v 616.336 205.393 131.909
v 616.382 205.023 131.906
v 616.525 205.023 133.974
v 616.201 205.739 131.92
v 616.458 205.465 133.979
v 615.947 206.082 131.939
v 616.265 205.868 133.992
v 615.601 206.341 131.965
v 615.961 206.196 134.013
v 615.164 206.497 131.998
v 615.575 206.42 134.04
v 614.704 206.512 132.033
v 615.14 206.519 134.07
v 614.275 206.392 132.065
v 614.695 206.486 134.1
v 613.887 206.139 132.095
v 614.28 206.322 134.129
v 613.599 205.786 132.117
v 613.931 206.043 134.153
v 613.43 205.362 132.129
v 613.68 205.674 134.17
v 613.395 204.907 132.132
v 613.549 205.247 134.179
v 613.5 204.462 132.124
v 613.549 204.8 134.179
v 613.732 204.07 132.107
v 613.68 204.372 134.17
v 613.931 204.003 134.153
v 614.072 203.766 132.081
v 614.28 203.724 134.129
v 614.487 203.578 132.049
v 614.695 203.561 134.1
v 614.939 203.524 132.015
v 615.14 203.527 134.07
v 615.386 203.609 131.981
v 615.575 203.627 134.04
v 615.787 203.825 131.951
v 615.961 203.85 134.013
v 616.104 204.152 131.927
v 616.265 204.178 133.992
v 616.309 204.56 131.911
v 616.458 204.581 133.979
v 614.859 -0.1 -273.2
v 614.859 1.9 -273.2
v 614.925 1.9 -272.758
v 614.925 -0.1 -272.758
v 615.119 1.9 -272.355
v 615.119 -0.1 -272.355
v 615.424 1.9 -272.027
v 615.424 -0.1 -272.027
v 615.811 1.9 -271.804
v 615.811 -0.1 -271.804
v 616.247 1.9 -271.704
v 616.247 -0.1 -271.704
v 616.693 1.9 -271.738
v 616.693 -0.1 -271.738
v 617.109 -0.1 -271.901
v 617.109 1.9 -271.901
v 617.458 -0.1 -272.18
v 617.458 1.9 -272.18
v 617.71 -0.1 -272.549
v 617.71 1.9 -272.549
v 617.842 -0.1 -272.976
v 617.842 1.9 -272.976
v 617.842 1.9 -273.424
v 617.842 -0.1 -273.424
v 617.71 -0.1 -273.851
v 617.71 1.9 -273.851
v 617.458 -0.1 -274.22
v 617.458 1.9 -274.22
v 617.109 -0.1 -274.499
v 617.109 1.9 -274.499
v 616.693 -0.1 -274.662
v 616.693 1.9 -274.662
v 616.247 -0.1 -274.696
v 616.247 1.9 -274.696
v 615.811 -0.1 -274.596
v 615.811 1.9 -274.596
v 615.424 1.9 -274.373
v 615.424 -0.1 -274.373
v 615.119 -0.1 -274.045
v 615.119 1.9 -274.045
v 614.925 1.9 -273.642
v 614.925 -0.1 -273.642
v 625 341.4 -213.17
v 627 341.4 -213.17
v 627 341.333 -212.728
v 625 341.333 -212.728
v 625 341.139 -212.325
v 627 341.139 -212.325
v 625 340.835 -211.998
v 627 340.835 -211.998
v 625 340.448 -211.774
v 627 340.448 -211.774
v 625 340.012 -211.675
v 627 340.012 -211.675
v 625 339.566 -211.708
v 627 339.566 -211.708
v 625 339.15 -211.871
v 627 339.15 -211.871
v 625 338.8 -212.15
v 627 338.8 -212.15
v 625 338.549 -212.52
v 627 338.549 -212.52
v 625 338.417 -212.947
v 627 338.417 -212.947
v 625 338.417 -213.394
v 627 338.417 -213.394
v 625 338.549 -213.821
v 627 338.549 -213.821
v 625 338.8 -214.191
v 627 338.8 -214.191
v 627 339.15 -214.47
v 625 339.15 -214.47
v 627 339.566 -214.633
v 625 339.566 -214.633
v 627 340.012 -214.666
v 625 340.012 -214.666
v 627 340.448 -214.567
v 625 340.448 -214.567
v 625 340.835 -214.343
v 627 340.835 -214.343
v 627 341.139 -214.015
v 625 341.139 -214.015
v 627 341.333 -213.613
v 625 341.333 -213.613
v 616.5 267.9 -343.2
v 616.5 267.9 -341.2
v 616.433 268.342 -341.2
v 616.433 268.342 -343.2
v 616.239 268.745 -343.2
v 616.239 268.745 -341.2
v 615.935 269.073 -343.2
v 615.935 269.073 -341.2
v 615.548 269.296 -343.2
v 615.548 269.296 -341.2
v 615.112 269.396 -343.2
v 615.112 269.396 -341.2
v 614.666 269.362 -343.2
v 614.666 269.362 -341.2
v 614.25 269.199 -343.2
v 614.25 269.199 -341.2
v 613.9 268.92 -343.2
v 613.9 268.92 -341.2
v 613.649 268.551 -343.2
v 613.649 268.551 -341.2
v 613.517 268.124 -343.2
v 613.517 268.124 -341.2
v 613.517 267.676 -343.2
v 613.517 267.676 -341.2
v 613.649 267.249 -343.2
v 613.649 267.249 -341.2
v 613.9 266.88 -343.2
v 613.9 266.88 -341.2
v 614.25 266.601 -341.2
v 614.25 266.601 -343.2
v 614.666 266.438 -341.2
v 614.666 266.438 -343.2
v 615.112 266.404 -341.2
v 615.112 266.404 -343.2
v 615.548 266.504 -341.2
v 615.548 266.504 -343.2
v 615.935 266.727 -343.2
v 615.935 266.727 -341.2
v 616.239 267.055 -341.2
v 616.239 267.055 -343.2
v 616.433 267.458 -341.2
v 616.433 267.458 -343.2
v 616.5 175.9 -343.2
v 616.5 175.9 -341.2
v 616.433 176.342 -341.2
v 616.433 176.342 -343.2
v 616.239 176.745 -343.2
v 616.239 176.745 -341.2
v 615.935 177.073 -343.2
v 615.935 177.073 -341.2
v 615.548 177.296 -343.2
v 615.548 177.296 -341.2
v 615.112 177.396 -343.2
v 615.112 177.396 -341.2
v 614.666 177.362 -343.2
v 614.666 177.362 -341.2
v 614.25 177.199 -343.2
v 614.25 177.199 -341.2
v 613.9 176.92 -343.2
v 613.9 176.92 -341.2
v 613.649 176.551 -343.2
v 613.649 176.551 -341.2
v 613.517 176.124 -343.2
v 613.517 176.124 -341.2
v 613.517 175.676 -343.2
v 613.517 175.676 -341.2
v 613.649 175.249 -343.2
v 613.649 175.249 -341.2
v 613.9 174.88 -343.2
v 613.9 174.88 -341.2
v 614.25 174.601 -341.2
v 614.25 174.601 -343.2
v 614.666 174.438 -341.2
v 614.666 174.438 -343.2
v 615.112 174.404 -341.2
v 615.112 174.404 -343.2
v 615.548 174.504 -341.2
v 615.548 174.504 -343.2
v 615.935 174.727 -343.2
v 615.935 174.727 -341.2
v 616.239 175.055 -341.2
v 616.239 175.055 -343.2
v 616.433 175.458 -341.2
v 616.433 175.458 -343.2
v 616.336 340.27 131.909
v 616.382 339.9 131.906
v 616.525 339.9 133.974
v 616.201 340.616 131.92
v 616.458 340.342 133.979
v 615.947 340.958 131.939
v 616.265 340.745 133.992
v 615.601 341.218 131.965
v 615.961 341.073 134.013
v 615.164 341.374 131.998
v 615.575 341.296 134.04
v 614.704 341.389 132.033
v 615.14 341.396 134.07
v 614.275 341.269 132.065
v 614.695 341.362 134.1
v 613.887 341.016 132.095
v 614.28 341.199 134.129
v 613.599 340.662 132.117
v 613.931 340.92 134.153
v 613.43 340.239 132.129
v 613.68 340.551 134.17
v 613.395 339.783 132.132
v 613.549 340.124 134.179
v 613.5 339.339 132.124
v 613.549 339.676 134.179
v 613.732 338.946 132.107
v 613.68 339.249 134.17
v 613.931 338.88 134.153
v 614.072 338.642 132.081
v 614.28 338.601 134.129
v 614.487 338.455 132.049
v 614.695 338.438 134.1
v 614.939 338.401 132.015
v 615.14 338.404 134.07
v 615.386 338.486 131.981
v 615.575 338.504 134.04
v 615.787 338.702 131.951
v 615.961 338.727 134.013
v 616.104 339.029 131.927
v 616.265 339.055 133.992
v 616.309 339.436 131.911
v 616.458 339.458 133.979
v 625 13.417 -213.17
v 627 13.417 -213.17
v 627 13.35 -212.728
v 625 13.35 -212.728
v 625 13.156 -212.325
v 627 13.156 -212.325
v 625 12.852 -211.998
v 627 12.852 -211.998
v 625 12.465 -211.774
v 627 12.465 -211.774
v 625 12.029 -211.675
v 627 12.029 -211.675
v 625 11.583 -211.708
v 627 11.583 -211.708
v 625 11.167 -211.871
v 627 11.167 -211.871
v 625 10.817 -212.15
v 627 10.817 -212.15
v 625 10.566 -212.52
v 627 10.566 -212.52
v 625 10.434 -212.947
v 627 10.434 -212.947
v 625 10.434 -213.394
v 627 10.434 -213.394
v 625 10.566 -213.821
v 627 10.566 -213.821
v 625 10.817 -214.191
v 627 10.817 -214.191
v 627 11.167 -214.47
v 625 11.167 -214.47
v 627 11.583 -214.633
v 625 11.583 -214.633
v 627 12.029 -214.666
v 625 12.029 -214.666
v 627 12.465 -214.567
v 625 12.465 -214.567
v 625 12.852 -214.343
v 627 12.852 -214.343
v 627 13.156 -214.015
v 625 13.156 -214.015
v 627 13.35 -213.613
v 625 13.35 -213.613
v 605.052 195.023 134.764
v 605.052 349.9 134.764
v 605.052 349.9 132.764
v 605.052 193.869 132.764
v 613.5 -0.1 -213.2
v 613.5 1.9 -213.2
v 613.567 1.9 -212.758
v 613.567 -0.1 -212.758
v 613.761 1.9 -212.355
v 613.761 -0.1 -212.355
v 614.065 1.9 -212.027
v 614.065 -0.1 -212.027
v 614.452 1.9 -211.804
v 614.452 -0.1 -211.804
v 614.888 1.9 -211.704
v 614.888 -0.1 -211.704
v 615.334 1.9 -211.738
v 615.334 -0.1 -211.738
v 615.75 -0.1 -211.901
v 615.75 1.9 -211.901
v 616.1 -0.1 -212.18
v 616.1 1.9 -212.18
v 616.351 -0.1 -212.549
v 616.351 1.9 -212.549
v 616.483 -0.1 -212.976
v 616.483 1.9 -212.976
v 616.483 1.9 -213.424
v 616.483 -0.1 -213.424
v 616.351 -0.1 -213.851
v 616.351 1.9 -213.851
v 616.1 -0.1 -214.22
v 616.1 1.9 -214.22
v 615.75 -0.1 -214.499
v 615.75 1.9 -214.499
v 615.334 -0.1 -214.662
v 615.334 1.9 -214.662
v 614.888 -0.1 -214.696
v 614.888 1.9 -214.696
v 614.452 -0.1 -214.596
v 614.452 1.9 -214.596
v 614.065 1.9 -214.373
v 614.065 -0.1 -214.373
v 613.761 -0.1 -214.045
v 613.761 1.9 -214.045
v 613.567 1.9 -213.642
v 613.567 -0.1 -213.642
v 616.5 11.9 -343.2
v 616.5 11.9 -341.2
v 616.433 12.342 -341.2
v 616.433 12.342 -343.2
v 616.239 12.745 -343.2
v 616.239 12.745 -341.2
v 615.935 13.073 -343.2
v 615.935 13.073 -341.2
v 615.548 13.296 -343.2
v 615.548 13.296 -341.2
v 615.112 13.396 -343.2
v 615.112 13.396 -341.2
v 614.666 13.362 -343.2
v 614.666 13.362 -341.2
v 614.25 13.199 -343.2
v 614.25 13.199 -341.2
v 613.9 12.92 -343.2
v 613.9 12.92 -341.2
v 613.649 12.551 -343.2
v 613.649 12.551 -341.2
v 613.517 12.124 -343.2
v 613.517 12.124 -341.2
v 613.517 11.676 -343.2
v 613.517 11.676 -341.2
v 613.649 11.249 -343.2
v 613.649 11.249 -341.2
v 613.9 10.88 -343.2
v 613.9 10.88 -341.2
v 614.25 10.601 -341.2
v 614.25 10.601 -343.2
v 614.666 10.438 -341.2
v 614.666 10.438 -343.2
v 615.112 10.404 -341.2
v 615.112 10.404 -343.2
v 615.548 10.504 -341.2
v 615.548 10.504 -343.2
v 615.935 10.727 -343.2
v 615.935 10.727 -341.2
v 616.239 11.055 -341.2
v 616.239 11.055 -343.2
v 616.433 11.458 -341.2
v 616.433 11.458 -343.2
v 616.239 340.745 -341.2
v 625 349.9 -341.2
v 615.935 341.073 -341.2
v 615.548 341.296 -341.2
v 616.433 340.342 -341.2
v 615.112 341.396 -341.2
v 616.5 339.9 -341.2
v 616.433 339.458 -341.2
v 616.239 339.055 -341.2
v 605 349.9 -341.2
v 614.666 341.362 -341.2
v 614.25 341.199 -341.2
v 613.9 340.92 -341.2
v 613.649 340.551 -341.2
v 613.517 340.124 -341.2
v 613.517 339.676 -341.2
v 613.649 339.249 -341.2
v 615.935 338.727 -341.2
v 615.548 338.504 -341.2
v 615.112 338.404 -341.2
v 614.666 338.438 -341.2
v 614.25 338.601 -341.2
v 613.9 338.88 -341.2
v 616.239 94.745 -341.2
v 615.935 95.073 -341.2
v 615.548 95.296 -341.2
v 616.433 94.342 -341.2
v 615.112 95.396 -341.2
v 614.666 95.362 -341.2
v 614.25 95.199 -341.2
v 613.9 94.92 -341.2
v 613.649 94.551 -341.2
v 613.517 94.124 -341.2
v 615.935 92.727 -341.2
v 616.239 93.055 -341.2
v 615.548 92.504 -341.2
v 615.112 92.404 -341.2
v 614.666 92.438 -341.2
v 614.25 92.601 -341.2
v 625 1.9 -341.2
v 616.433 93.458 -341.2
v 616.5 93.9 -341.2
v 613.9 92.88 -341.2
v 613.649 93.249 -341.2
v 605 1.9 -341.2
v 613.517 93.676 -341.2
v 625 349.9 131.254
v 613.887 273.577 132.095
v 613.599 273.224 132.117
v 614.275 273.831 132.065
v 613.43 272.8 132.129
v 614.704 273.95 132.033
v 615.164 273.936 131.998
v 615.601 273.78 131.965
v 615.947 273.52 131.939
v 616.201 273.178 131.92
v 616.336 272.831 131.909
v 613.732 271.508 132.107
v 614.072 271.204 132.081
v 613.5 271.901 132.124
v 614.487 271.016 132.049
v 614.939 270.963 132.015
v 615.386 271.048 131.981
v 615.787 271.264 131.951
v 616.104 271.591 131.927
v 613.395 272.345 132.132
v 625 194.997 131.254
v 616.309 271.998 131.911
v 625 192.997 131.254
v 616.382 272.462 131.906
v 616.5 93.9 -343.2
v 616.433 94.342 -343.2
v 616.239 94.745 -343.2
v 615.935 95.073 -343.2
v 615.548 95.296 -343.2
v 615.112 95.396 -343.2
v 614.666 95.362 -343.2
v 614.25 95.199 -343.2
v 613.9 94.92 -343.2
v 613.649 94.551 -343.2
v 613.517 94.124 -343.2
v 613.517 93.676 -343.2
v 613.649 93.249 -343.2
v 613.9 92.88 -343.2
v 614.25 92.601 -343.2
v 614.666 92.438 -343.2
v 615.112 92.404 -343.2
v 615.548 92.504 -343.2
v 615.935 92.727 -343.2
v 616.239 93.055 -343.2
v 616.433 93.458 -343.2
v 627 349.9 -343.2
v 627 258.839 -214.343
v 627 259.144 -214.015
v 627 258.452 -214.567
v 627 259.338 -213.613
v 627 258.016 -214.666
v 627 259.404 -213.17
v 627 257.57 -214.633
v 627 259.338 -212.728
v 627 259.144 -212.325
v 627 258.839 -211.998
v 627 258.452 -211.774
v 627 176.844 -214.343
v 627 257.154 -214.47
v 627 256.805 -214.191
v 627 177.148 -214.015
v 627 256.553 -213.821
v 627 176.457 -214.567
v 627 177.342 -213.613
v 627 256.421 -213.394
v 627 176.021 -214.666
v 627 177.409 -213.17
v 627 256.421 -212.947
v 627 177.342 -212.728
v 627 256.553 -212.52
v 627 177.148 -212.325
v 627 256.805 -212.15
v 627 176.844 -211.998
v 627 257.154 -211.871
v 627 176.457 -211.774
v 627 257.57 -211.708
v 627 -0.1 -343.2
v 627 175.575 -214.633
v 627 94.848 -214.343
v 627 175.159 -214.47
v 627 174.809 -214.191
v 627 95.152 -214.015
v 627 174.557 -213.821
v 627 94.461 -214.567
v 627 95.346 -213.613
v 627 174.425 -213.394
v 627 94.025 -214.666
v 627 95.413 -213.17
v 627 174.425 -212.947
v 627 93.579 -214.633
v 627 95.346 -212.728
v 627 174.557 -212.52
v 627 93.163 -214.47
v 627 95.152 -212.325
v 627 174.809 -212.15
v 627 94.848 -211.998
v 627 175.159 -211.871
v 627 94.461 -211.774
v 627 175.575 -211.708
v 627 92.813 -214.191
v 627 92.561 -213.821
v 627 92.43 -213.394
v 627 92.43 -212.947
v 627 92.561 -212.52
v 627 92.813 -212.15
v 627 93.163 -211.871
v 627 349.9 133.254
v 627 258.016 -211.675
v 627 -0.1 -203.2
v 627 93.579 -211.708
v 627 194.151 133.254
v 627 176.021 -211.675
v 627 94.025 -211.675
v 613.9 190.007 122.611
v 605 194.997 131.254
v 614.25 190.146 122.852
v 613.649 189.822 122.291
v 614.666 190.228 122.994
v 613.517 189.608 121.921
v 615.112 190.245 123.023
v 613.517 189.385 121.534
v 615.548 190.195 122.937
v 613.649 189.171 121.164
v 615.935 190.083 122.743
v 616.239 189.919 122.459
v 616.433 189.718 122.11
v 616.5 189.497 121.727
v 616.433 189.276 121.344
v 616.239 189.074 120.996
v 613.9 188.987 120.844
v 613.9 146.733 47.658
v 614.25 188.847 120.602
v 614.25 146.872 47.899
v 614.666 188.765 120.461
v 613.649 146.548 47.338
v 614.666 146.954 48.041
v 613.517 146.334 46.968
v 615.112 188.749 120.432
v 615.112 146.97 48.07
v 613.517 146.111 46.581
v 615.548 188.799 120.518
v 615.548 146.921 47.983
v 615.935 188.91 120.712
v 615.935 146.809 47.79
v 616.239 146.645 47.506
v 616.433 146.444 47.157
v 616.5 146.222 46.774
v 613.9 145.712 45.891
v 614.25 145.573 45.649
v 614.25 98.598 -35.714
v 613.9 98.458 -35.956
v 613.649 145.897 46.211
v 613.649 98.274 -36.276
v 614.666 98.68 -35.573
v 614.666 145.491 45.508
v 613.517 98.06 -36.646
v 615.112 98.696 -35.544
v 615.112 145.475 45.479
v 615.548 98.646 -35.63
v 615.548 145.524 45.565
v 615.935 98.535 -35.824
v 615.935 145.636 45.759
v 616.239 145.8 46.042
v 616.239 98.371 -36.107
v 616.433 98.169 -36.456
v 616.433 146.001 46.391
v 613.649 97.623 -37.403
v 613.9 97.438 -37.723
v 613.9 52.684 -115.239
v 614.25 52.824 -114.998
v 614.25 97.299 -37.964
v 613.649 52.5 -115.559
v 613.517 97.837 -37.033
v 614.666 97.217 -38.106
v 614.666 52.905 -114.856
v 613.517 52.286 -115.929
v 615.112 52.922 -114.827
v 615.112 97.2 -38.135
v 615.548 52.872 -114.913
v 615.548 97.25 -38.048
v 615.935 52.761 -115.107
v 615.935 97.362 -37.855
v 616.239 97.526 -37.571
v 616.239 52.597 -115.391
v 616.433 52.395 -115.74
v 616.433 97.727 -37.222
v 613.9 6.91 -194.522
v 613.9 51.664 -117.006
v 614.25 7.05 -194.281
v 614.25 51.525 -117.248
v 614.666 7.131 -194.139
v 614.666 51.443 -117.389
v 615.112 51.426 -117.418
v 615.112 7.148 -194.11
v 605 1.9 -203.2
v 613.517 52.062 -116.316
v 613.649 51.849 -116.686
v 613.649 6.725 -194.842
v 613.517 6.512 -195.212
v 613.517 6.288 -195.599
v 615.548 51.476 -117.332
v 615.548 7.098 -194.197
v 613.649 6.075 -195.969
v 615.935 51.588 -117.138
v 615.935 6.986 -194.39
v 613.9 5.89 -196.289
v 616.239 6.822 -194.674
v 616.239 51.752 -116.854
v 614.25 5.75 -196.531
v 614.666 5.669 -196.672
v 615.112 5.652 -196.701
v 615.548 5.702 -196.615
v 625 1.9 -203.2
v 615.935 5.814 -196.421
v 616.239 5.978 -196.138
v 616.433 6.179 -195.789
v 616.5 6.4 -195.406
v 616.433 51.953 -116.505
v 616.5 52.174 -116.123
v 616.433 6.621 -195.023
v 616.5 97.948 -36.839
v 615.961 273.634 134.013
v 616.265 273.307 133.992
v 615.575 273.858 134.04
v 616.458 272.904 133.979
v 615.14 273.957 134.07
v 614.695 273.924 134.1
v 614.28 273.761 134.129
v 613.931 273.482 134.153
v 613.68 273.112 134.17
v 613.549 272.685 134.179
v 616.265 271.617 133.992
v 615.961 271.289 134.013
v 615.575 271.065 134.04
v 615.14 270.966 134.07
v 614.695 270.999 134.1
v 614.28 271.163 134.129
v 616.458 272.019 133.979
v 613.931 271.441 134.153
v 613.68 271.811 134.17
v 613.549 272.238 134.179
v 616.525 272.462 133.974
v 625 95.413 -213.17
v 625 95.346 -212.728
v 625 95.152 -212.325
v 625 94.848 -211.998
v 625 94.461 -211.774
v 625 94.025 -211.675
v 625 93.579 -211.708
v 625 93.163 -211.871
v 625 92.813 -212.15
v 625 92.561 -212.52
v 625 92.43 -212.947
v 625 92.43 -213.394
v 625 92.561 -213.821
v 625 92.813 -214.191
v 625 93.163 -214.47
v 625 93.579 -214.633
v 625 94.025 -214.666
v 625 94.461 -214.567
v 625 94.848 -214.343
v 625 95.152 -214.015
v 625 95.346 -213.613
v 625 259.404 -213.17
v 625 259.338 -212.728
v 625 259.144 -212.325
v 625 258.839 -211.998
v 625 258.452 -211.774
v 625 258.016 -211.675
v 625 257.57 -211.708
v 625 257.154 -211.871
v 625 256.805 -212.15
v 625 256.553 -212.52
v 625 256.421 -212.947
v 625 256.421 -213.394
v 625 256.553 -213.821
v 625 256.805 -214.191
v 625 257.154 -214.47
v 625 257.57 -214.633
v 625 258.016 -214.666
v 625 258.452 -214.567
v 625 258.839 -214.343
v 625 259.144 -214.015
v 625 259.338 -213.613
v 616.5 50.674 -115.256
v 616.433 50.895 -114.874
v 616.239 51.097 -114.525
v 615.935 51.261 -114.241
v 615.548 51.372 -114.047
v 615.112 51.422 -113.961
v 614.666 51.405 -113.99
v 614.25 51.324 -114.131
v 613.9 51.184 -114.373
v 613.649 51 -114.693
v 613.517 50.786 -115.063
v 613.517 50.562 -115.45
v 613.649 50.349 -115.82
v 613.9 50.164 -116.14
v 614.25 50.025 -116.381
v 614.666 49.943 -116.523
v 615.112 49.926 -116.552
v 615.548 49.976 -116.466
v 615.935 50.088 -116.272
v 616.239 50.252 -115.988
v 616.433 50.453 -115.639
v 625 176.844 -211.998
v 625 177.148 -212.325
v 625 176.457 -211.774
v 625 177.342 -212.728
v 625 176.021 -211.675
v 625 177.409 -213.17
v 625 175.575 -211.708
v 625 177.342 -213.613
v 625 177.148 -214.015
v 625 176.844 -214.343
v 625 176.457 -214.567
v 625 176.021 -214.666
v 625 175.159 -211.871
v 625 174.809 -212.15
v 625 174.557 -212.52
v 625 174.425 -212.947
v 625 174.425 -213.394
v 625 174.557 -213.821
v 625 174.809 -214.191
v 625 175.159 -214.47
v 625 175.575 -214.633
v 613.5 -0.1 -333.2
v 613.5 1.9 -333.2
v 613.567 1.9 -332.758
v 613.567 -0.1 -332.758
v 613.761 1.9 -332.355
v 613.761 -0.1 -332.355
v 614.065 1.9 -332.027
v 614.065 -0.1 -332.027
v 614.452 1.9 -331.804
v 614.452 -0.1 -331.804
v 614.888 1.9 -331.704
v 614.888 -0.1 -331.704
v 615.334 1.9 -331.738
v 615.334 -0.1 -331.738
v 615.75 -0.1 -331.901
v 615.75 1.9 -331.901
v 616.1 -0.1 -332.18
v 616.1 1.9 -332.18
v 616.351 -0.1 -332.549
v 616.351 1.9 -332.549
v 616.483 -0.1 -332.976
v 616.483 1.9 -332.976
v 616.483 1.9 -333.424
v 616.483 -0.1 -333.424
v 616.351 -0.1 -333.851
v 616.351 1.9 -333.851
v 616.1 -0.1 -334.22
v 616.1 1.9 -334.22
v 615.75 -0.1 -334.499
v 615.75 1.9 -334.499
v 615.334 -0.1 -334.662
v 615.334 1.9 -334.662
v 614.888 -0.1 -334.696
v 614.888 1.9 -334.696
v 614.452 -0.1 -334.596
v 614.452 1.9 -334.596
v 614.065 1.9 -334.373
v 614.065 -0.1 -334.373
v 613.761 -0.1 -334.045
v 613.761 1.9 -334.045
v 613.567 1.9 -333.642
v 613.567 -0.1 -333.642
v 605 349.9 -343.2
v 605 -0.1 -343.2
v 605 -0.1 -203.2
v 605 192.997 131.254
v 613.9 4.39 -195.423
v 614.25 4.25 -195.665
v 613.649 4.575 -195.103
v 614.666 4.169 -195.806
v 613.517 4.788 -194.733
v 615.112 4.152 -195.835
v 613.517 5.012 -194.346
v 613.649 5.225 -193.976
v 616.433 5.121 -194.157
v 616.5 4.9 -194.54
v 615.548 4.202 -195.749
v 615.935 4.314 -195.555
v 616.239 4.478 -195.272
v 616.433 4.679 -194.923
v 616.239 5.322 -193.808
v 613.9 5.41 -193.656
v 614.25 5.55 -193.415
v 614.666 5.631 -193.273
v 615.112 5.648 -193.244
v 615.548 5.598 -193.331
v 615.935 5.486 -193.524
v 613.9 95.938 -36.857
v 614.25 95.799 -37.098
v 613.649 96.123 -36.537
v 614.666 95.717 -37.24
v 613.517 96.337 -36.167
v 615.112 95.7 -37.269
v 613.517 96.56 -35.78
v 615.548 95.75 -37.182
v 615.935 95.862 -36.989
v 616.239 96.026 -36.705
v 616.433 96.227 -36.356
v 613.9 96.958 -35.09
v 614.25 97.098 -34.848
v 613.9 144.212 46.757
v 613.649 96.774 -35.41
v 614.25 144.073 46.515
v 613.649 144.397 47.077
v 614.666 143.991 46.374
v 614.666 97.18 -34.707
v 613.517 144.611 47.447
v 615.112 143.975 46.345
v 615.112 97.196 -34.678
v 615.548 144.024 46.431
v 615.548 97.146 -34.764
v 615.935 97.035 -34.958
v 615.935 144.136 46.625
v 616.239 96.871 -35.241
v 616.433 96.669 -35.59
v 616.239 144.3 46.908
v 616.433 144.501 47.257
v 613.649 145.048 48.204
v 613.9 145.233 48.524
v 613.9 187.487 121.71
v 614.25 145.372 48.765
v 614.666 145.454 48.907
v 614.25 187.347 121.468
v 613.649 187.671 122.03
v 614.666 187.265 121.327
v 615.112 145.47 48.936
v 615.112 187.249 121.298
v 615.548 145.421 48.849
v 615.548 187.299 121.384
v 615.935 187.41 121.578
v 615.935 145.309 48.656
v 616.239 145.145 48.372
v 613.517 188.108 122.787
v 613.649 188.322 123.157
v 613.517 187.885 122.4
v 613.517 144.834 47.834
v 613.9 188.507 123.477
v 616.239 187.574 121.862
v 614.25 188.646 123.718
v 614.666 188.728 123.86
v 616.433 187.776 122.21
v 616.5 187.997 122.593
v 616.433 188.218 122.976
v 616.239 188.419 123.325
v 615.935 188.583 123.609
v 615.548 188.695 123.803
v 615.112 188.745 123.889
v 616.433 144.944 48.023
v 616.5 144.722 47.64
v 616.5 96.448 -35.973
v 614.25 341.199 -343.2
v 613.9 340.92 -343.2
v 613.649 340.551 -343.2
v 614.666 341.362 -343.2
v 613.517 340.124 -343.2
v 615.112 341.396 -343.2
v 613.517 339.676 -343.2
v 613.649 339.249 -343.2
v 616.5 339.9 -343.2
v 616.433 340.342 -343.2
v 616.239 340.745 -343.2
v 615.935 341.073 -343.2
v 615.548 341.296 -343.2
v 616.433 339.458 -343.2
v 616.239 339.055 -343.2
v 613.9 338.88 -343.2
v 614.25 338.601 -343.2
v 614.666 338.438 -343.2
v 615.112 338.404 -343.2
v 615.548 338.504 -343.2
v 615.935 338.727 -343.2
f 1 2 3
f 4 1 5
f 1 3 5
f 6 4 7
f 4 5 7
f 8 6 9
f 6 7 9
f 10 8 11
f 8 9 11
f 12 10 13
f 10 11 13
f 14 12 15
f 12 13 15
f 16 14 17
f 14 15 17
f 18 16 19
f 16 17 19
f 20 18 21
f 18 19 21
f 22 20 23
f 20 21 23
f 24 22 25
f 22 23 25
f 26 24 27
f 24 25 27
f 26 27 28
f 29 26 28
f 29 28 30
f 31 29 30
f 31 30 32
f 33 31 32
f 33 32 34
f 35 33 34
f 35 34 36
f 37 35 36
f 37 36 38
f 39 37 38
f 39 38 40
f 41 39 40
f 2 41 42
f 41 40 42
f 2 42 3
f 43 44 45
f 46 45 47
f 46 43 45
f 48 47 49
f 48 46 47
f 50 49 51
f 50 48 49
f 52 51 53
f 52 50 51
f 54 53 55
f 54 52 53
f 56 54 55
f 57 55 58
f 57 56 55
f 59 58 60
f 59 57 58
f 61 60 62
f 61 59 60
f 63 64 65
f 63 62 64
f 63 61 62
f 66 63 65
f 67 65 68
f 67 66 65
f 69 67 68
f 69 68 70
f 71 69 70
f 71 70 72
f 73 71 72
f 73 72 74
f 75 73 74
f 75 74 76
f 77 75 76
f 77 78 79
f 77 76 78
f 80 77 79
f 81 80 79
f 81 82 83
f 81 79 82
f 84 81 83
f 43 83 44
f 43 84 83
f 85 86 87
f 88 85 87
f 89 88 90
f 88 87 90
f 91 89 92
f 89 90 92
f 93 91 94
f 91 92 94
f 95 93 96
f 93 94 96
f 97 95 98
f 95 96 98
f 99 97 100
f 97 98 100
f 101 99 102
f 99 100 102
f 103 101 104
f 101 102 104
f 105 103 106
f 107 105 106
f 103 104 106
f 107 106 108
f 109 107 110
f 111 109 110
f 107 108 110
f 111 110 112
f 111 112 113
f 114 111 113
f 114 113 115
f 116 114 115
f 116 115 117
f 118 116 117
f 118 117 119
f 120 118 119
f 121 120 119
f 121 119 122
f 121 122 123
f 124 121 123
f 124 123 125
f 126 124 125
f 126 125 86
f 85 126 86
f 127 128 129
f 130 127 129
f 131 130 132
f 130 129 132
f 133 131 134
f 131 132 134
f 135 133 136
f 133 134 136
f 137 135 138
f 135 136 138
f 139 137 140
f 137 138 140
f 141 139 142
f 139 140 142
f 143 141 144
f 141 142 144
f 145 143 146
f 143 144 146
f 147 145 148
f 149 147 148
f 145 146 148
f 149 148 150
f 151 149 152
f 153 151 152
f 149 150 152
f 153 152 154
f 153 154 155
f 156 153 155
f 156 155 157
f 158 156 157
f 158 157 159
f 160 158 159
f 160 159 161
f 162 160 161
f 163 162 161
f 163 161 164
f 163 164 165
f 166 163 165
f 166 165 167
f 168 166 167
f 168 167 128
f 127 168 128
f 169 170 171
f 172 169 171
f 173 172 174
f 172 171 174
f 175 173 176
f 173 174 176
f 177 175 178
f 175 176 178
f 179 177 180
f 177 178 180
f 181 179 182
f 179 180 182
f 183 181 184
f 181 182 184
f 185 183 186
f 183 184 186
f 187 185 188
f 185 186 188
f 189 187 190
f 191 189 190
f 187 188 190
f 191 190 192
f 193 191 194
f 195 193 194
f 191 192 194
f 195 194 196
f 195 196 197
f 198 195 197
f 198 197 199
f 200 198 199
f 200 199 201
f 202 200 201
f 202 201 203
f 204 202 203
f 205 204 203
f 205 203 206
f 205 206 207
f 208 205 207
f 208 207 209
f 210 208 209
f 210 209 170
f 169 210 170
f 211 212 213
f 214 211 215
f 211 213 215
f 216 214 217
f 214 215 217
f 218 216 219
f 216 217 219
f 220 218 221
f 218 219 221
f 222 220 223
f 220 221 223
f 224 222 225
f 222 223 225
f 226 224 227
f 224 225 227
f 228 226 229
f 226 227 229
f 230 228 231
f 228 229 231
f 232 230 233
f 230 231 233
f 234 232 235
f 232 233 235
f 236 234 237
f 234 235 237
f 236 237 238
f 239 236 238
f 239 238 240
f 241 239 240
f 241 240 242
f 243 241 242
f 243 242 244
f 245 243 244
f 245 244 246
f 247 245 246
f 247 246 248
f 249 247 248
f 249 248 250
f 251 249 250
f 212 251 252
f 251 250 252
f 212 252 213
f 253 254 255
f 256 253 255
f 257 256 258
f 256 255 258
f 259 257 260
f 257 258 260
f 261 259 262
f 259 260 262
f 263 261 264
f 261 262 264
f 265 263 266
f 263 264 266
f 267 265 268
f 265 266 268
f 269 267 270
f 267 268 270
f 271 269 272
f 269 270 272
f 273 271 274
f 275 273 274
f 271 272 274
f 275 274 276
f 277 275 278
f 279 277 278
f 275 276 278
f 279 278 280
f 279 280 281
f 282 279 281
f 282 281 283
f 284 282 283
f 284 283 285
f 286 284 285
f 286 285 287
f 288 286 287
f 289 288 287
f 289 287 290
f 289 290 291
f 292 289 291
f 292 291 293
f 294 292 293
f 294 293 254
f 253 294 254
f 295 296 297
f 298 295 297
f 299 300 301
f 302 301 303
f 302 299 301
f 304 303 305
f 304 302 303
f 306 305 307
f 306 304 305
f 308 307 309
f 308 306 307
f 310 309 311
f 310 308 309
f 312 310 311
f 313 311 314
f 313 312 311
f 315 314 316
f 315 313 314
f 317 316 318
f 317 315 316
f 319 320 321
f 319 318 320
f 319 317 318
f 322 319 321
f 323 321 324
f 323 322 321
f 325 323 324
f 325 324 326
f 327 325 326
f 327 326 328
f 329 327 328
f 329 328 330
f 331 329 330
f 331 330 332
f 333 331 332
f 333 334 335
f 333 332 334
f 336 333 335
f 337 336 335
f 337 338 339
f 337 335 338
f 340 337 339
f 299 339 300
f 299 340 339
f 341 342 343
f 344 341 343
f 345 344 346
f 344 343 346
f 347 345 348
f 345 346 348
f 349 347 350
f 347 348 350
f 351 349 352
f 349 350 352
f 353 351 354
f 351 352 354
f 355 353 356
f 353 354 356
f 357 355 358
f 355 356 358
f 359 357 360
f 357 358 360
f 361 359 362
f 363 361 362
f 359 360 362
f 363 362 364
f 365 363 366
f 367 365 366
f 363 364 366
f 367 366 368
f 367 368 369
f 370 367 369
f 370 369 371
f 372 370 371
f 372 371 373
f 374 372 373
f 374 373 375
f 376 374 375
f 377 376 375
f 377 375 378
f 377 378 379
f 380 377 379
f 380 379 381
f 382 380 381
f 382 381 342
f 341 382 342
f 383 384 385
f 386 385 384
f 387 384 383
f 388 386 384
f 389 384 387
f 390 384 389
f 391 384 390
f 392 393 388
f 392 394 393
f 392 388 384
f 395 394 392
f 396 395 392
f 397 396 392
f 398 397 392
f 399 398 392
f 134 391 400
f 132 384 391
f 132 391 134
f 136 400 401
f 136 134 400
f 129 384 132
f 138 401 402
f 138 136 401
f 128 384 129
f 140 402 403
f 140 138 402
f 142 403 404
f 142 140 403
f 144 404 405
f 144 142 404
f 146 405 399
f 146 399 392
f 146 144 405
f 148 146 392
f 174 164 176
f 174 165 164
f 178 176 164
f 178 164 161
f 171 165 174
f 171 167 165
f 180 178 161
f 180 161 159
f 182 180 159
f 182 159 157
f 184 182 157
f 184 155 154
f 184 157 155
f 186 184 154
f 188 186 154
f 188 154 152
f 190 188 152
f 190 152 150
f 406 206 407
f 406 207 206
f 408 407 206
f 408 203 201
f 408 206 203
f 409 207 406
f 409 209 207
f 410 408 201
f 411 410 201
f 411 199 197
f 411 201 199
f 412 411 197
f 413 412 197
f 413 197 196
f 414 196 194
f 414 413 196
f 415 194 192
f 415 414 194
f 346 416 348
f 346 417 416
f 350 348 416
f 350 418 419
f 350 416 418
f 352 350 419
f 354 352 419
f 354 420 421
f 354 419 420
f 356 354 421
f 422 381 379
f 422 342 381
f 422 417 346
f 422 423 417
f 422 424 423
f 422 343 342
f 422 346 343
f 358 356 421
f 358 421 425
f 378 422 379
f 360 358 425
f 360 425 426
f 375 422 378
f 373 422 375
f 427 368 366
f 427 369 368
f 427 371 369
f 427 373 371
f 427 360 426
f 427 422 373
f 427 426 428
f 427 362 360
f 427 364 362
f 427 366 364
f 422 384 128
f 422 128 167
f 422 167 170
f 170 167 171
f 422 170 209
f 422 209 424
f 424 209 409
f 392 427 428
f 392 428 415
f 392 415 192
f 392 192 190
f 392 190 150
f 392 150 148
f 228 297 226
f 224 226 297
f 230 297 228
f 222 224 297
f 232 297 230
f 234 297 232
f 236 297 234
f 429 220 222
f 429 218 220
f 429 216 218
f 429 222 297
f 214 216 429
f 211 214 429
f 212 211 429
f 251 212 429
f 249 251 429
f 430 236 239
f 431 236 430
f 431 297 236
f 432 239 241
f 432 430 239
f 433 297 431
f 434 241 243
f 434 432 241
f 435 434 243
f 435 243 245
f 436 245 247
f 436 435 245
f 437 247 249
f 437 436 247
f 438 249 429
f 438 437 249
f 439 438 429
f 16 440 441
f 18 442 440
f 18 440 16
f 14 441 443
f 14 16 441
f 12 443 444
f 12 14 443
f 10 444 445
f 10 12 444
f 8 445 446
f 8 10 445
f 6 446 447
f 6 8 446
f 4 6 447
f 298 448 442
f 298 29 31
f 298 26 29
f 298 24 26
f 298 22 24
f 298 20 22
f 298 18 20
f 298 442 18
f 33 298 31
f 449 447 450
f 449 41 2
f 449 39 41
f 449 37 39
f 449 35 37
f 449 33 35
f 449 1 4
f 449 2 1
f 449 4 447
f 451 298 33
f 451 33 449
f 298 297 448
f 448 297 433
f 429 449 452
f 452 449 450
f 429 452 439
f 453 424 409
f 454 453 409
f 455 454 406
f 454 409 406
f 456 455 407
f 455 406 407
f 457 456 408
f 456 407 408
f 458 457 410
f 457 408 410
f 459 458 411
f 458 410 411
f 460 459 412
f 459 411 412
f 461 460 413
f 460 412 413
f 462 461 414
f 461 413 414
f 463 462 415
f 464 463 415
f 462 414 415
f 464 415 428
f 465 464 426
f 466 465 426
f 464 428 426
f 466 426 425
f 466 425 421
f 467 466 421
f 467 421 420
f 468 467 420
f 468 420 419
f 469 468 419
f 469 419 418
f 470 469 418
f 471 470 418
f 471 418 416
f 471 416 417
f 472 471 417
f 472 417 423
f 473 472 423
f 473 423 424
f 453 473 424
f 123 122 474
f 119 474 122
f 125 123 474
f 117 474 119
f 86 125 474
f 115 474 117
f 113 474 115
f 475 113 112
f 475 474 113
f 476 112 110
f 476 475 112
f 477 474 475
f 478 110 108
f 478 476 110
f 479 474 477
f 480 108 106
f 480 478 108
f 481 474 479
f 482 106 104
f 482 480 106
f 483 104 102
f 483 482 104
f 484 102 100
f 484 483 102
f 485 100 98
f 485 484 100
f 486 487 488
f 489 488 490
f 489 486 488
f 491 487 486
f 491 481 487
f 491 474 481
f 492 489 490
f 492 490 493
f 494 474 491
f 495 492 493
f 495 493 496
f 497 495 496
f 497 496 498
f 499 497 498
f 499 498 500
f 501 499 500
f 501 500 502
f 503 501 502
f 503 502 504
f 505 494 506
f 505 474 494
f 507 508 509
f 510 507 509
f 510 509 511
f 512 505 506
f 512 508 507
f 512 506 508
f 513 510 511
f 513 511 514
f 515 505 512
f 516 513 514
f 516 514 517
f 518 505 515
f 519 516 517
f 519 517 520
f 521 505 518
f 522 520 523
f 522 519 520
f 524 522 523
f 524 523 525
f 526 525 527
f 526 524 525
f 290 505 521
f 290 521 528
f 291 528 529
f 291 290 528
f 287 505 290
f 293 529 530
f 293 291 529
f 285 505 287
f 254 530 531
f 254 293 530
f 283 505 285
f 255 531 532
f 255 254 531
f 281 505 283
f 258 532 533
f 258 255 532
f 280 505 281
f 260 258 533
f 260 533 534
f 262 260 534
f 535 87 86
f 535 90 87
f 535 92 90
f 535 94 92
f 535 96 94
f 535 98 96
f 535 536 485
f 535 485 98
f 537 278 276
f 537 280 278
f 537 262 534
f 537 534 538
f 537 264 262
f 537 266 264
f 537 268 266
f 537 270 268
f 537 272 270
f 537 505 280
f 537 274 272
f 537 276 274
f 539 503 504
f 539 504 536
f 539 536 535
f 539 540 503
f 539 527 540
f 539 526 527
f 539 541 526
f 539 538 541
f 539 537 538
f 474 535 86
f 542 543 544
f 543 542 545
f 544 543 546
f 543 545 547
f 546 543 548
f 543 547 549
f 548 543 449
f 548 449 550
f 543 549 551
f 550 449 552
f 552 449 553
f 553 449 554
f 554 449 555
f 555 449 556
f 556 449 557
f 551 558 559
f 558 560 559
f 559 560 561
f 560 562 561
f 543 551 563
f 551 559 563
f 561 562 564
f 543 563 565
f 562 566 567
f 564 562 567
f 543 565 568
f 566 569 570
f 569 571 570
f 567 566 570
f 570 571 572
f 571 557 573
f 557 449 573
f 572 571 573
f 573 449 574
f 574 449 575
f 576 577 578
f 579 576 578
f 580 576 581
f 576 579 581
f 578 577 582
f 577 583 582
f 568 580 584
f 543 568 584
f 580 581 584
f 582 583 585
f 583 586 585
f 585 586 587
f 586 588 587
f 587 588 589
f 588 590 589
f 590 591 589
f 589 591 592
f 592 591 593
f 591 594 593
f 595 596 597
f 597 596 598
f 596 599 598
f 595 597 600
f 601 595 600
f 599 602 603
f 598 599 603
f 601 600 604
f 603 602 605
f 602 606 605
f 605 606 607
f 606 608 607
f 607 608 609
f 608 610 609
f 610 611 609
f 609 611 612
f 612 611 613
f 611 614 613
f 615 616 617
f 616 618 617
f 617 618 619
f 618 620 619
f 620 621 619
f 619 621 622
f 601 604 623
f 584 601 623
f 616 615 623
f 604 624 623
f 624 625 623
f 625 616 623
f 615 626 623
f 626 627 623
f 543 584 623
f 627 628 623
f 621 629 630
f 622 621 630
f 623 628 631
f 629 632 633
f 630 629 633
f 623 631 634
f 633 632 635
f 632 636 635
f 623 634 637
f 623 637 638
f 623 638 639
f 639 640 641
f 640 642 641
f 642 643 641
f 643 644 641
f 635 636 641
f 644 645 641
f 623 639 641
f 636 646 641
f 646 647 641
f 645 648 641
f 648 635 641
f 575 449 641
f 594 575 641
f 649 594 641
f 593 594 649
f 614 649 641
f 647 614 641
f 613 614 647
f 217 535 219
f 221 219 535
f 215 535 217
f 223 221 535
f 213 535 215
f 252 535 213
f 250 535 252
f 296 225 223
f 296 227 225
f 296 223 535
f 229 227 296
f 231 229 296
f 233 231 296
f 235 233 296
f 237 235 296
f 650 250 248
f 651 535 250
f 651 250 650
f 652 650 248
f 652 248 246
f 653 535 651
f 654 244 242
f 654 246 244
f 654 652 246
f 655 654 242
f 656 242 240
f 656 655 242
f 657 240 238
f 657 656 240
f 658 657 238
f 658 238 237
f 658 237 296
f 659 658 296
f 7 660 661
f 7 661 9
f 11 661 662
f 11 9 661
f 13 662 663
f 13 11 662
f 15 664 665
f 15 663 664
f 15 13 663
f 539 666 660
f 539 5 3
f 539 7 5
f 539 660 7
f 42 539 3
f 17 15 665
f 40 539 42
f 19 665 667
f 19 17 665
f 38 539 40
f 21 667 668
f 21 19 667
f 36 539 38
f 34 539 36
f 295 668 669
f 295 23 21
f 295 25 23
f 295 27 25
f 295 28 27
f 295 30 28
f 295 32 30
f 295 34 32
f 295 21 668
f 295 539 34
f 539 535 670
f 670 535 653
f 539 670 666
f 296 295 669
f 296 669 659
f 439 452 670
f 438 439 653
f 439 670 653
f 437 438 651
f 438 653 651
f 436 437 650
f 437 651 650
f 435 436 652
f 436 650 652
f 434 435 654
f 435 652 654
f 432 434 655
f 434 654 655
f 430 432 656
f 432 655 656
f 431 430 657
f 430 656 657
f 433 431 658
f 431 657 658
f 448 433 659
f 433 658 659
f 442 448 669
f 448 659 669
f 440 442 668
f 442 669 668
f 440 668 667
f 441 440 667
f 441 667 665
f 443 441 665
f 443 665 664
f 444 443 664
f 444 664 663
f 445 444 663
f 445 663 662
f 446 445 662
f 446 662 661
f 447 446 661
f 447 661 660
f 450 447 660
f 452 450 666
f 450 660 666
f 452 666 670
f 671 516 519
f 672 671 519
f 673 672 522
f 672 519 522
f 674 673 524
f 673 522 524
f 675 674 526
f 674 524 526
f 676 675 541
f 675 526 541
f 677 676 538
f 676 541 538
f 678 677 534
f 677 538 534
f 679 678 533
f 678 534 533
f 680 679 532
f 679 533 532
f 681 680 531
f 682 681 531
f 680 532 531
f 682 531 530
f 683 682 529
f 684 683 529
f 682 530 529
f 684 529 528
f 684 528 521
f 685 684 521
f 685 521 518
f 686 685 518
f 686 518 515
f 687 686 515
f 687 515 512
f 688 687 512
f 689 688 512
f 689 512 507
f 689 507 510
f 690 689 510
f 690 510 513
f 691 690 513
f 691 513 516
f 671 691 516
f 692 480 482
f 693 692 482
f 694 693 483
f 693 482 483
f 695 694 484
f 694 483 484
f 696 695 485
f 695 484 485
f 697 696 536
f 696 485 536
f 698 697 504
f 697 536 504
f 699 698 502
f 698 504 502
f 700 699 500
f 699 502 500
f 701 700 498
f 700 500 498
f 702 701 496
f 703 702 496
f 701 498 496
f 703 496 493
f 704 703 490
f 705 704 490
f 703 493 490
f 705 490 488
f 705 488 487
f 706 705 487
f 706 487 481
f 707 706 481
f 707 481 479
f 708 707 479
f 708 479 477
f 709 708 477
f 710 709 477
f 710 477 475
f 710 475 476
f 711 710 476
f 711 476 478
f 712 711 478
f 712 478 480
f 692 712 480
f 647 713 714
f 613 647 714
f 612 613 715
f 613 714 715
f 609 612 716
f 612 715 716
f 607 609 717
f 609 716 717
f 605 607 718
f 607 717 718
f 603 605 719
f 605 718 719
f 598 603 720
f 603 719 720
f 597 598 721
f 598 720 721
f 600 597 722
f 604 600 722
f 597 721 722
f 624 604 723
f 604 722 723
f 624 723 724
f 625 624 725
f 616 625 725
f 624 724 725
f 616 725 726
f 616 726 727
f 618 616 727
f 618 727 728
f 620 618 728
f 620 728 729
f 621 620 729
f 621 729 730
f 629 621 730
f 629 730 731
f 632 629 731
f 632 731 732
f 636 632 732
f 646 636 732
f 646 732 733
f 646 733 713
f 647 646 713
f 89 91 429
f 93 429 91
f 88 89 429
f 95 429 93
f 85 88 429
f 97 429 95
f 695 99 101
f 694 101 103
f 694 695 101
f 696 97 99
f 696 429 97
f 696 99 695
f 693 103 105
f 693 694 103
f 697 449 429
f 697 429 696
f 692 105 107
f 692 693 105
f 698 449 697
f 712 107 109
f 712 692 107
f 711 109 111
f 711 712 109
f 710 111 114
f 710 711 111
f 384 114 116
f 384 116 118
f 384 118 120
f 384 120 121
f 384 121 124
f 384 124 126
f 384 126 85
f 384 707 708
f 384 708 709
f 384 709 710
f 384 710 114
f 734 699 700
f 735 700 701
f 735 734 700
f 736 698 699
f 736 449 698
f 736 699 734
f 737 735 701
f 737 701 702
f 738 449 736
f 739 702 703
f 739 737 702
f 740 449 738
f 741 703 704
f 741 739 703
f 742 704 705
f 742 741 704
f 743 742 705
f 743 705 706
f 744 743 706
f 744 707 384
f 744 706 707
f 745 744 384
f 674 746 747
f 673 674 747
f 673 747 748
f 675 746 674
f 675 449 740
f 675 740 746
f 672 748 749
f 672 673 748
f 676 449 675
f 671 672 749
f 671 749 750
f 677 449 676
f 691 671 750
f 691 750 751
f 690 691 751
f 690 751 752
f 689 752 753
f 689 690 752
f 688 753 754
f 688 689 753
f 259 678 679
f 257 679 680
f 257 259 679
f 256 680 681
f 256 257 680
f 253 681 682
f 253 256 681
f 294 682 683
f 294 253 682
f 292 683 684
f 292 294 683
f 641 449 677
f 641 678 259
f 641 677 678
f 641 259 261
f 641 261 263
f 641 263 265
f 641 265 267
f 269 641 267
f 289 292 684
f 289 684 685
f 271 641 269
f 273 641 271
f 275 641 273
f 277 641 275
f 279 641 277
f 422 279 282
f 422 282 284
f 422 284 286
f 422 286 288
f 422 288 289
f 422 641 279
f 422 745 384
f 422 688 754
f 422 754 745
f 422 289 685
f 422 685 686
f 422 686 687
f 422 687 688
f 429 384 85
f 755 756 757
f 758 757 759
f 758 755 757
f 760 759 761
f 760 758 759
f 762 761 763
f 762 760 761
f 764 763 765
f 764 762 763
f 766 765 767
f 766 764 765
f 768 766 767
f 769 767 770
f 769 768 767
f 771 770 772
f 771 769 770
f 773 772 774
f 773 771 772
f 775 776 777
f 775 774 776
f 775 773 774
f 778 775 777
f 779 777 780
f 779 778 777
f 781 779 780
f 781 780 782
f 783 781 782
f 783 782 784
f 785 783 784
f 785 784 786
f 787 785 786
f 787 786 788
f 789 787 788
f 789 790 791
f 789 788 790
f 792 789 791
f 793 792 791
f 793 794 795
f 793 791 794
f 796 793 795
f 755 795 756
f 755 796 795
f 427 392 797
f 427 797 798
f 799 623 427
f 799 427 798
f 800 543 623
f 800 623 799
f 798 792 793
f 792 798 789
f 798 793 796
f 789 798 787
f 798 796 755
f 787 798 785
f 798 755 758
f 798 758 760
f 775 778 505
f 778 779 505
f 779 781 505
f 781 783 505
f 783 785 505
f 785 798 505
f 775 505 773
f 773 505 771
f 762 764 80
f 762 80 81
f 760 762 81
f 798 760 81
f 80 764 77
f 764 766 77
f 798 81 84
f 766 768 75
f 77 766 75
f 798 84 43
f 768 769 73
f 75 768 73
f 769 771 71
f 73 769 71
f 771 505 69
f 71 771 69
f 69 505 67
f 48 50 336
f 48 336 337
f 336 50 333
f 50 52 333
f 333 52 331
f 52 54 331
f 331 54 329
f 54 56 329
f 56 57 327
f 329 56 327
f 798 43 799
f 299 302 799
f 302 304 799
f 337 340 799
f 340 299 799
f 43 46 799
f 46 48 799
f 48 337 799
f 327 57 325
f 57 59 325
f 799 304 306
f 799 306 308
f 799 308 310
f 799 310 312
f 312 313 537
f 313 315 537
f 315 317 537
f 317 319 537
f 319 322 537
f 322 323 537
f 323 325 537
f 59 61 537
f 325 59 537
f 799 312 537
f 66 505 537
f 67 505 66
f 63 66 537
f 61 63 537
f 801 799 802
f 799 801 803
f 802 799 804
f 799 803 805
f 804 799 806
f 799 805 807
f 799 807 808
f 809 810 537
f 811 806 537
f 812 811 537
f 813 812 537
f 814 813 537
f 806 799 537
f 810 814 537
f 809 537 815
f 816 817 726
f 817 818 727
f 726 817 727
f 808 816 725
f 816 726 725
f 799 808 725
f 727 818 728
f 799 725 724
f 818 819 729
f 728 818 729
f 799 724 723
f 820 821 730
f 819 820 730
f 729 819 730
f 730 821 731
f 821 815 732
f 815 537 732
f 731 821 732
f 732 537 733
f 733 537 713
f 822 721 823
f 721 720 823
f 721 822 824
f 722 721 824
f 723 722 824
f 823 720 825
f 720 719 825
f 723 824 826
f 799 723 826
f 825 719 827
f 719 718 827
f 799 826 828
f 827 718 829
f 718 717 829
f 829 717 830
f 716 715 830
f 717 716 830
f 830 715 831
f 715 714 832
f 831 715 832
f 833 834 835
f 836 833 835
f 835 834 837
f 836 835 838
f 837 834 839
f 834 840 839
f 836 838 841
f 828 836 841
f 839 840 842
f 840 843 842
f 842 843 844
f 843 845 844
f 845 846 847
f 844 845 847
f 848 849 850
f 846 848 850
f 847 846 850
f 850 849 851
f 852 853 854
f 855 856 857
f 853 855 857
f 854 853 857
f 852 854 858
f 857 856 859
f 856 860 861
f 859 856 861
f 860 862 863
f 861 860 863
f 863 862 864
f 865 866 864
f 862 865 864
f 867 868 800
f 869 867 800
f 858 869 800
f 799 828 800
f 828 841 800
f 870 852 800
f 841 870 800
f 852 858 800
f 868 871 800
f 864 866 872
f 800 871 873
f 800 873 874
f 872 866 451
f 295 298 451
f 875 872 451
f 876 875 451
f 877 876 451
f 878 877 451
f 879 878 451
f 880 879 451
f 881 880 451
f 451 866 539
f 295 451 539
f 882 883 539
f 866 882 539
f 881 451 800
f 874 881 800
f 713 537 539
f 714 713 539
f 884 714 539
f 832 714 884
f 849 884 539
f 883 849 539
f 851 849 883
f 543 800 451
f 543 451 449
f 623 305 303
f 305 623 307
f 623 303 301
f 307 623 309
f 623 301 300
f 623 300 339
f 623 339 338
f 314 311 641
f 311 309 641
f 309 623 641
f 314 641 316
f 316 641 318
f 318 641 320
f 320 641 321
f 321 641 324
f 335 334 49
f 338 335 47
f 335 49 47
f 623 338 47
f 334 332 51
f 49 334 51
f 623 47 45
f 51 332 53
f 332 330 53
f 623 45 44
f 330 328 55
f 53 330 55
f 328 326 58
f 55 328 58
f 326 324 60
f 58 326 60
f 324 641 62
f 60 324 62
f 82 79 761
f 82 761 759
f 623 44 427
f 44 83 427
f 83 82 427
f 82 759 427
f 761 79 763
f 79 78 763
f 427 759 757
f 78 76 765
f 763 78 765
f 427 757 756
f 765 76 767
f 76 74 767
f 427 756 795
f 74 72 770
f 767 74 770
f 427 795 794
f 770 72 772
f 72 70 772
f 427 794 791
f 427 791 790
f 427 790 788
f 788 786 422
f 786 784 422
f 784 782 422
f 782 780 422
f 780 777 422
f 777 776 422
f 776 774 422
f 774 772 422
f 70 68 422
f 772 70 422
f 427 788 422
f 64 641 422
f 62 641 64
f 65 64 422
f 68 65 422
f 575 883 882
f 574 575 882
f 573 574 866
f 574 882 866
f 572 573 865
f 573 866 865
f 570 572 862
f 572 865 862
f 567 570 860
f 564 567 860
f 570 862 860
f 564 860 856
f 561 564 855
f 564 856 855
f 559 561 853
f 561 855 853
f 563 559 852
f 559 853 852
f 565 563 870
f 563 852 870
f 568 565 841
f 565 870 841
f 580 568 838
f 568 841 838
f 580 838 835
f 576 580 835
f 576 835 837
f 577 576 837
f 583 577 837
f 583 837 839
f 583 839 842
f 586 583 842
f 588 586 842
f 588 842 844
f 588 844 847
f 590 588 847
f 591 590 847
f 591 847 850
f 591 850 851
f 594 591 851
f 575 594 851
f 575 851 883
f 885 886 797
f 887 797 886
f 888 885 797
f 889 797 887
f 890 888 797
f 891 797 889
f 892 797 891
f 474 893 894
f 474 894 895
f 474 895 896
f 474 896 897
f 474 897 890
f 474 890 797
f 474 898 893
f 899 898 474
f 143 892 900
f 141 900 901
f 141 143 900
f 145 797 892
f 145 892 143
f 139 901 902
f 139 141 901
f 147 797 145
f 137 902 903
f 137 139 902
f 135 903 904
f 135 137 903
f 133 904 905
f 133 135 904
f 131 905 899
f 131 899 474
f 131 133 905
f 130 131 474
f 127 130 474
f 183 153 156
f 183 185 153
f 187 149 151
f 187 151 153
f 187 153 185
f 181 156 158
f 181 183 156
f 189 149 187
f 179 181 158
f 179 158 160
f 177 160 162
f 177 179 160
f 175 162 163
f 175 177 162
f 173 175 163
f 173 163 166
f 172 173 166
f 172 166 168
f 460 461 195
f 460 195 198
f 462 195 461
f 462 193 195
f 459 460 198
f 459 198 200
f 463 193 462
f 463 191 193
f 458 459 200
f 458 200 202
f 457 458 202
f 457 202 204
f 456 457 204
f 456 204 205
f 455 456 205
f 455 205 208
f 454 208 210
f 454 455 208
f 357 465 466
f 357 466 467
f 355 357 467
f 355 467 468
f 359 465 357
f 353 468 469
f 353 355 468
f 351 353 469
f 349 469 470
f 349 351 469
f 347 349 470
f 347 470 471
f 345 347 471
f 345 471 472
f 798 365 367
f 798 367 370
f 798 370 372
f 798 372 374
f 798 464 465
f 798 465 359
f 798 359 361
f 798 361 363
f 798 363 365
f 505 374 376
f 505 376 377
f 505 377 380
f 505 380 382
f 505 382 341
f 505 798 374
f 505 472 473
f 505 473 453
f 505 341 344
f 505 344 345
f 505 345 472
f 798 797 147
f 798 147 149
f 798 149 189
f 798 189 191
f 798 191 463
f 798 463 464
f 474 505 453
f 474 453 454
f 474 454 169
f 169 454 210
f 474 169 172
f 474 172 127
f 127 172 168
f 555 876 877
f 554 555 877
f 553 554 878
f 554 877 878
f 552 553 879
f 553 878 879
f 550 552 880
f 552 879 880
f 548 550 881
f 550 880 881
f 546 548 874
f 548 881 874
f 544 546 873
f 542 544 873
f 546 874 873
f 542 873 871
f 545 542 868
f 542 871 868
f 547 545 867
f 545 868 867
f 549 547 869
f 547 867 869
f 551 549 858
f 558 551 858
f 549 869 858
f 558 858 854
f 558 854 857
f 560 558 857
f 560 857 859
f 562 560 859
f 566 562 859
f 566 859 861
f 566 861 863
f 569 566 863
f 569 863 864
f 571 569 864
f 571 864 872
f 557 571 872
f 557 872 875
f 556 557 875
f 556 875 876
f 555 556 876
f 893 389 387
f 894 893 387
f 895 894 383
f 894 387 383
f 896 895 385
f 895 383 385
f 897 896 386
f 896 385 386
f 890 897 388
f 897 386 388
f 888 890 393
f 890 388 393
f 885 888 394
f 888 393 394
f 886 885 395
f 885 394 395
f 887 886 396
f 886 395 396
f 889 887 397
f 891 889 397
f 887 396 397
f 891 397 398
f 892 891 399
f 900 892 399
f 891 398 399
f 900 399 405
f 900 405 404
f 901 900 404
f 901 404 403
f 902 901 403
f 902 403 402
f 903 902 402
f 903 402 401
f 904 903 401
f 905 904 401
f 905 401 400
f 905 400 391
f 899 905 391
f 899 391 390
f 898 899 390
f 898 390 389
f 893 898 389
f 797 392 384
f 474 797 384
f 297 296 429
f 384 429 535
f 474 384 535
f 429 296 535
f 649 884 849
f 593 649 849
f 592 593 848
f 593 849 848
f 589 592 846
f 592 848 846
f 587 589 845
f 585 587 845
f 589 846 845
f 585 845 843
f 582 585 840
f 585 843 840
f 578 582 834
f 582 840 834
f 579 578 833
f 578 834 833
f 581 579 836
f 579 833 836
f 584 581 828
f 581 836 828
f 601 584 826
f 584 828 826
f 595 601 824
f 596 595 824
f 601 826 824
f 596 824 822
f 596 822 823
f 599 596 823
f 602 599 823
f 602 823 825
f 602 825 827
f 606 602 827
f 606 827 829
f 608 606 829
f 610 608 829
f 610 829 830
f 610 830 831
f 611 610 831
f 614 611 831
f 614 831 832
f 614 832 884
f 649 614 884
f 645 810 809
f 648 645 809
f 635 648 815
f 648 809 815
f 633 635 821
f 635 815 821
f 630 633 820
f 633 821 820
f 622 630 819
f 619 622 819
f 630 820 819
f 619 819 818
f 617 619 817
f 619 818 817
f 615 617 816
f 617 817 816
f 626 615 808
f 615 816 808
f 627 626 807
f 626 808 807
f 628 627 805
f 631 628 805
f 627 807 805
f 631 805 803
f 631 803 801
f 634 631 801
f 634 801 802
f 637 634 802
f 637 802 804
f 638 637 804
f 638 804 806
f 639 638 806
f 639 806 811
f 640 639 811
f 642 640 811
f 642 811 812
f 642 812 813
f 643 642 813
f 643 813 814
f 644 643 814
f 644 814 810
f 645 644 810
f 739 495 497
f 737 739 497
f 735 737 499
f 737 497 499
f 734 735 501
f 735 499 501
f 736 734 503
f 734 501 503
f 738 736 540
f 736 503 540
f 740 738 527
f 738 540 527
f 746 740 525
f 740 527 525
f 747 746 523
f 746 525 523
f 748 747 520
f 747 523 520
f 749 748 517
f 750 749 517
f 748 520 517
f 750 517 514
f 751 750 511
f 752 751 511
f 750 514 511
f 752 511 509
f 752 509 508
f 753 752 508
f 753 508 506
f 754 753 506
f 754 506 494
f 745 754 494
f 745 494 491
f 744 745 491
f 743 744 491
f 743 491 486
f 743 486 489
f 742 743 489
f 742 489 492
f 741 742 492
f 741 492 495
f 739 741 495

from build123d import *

# Parameters (mm, degrees)
PAD009_DEPTH    = 350
POCKET015_DEPTH = 22.001
PAD010_DEPTH    = 20
SKETCH031_R     = 1.5
POCKET016_DEPTH = 5
SKETCH032_R     = 1.5
POCKET017_DEPTH = 5
SKETCH033_R     = 1.5
POCKET018_DEPTH = 5
SKETCH035_R     = 1.5
POCKET020_DEPTH = 5
SKETCH071_R     = 1.5
POCKET047_DEPTH = 5


with BuildPart() as part:
    # Sketch028 (on Face2 of Binder006) → Pad009 (new body)
    with BuildSketch(Plane(origin=(0, -0.1, 0), x_dir=(-1, 0, 0), z_dir=(0, 1, 0))):
        Polygon((-627, -343.2), (-627, 133.2535631324), (-605.051890377, 134.7636902715), (-605.051890377, 132.7636902715), (-625, 131.2535631324), (-625, -341.2), (-605, -341.2), (-605, -343.2), align=None)
    extrude(amount=PAD009_DEPTH)

    # Sketch029 (on Face2 of Pad009) → Pocket015 (cut, through all)
    with BuildSketch(Plane.YZ.offset(627)):
        Polygon((-0.1, -203.2), (195.0232253156, 134.7636902715), (-0.1, 134.7636902715), align=None)
    extrude(amount=-POCKET015_DEPTH, mode=Mode.SUBTRACT)

    # Sketch030 (on Face9 of Pocket015) → Pad010 (join)
    with BuildSketch(Plane(origin=(625, 0, 0), x_dir=(0, -1, 0), z_dir=(-1, 0, 0))):
        Polygon((0.1, -341.2), (0.1, -203.2), (-192.9966545674, 131.2535631324), (-194.9966545674, 131.2535631324), (-1.9, -203.2), (-1.9, -341.2), align=None)
    extrude(amount=PAD010_DEPTH)

    # Sketch031 (on Face2 of Binder006) → Pocket016 (cut)
    with BuildSketch(Plane(origin=(0, -0.1, 0), x_dir=(-1, 0, 0), z_dir=(0, 1, 0))):
        with Locations((-615, -213.2)):
            Circle(SKETCH031_R)
        with Locations((-616.35879, -273.2)):
            Circle(SKETCH031_R)
        with Locations((-615, -333.2)):
            Circle(SKETCH031_R)
    extrude(amount=POCKET016_DEPTH, mode=Mode.SUBTRACT)

    # Sketch032 (on Face6 of Pocket016) → Pocket017 (cut)
    with BuildSketch(Plane(origin=(0, 87.9131353872, -50.7566197735), x_dir=(1, 0, 0), z_dir=(0, -0.8660256282, 0.4999996113))):
        with Locations((615, -166.026408)):
            Circle(SKETCH032_R)
        with Locations((615, 17.070397)):
            Circle(SKETCH032_R)
        with Locations((615, 113.6188)):
            Circle(SKETCH032_R)
        with Locations((615, 200.167202)):
            Circle(SKETCH032_R)
        with Locations((615, -74.478005)):
            Circle(SKETCH032_R)
    extrude(amount=-POCKET017_DEPTH, mode=Mode.SUBTRACT)

    # Sketch033 (on Face10 of Pocket017) → Pocket018 (cut)
    with BuildSketch(Plane.XY.offset(-341.2)):
        with Locations((615, 11.9)):
            Circle(SKETCH033_R)
        with Locations((615, 93.9)):
            Circle(SKETCH033_R)
        with Locations((615, 175.9)):
            Circle(SKETCH033_R)
        with Locations((615, 267.9)):
            Circle(SKETCH033_R)
        with Locations((615, 339.9)):
            Circle(SKETCH033_R)
    extrude(amount=-POCKET018_DEPTH, mode=Mode.SUBTRACT)

    # Sketch035 (on Face19 of Pocket018) → Pocket020 (cut)
    with BuildSketch(Plane(origin=(12.0794992713, 0, 175.5628167535), x_dir=(0.9976413465, 0, -0.0686421427), z_dir=(0.0686421427, 0, 0.9976413465))):
        with Locations((604.374314, 272.461613)):
            Circle(SKETCH035_R)
        with Locations((604.374314, 339.9)):
            Circle(SKETCH035_R)
        with Locations((604.374314, 205.023225)):
            Circle(SKETCH035_R)
    extrude(amount=-POCKET020_DEPTH, mode=Mode.SUBTRACT)

    # Sketch071 (on Face1 of Binder021) → Pocket047 (cut)
    with BuildSketch(Plane.YZ.offset(629)):
        with Locations((339.9, -213.170471)):
            Circle(SKETCH071_R)
        with Locations((257.904262, -213.170471)):
            Circle(SKETCH071_R)
        with Locations((175.908524, -213.170471)):
            Circle(SKETCH071_R)
        with Locations((93.912786, -213.170471)):
            Circle(SKETCH071_R)
        with Locations((11.917049, -213.170471)):
            Circle(SKETCH071_R)
    extrude(amount=-POCKET047_DEPTH, mode=Mode.SUBTRACT)


solid = part.part
